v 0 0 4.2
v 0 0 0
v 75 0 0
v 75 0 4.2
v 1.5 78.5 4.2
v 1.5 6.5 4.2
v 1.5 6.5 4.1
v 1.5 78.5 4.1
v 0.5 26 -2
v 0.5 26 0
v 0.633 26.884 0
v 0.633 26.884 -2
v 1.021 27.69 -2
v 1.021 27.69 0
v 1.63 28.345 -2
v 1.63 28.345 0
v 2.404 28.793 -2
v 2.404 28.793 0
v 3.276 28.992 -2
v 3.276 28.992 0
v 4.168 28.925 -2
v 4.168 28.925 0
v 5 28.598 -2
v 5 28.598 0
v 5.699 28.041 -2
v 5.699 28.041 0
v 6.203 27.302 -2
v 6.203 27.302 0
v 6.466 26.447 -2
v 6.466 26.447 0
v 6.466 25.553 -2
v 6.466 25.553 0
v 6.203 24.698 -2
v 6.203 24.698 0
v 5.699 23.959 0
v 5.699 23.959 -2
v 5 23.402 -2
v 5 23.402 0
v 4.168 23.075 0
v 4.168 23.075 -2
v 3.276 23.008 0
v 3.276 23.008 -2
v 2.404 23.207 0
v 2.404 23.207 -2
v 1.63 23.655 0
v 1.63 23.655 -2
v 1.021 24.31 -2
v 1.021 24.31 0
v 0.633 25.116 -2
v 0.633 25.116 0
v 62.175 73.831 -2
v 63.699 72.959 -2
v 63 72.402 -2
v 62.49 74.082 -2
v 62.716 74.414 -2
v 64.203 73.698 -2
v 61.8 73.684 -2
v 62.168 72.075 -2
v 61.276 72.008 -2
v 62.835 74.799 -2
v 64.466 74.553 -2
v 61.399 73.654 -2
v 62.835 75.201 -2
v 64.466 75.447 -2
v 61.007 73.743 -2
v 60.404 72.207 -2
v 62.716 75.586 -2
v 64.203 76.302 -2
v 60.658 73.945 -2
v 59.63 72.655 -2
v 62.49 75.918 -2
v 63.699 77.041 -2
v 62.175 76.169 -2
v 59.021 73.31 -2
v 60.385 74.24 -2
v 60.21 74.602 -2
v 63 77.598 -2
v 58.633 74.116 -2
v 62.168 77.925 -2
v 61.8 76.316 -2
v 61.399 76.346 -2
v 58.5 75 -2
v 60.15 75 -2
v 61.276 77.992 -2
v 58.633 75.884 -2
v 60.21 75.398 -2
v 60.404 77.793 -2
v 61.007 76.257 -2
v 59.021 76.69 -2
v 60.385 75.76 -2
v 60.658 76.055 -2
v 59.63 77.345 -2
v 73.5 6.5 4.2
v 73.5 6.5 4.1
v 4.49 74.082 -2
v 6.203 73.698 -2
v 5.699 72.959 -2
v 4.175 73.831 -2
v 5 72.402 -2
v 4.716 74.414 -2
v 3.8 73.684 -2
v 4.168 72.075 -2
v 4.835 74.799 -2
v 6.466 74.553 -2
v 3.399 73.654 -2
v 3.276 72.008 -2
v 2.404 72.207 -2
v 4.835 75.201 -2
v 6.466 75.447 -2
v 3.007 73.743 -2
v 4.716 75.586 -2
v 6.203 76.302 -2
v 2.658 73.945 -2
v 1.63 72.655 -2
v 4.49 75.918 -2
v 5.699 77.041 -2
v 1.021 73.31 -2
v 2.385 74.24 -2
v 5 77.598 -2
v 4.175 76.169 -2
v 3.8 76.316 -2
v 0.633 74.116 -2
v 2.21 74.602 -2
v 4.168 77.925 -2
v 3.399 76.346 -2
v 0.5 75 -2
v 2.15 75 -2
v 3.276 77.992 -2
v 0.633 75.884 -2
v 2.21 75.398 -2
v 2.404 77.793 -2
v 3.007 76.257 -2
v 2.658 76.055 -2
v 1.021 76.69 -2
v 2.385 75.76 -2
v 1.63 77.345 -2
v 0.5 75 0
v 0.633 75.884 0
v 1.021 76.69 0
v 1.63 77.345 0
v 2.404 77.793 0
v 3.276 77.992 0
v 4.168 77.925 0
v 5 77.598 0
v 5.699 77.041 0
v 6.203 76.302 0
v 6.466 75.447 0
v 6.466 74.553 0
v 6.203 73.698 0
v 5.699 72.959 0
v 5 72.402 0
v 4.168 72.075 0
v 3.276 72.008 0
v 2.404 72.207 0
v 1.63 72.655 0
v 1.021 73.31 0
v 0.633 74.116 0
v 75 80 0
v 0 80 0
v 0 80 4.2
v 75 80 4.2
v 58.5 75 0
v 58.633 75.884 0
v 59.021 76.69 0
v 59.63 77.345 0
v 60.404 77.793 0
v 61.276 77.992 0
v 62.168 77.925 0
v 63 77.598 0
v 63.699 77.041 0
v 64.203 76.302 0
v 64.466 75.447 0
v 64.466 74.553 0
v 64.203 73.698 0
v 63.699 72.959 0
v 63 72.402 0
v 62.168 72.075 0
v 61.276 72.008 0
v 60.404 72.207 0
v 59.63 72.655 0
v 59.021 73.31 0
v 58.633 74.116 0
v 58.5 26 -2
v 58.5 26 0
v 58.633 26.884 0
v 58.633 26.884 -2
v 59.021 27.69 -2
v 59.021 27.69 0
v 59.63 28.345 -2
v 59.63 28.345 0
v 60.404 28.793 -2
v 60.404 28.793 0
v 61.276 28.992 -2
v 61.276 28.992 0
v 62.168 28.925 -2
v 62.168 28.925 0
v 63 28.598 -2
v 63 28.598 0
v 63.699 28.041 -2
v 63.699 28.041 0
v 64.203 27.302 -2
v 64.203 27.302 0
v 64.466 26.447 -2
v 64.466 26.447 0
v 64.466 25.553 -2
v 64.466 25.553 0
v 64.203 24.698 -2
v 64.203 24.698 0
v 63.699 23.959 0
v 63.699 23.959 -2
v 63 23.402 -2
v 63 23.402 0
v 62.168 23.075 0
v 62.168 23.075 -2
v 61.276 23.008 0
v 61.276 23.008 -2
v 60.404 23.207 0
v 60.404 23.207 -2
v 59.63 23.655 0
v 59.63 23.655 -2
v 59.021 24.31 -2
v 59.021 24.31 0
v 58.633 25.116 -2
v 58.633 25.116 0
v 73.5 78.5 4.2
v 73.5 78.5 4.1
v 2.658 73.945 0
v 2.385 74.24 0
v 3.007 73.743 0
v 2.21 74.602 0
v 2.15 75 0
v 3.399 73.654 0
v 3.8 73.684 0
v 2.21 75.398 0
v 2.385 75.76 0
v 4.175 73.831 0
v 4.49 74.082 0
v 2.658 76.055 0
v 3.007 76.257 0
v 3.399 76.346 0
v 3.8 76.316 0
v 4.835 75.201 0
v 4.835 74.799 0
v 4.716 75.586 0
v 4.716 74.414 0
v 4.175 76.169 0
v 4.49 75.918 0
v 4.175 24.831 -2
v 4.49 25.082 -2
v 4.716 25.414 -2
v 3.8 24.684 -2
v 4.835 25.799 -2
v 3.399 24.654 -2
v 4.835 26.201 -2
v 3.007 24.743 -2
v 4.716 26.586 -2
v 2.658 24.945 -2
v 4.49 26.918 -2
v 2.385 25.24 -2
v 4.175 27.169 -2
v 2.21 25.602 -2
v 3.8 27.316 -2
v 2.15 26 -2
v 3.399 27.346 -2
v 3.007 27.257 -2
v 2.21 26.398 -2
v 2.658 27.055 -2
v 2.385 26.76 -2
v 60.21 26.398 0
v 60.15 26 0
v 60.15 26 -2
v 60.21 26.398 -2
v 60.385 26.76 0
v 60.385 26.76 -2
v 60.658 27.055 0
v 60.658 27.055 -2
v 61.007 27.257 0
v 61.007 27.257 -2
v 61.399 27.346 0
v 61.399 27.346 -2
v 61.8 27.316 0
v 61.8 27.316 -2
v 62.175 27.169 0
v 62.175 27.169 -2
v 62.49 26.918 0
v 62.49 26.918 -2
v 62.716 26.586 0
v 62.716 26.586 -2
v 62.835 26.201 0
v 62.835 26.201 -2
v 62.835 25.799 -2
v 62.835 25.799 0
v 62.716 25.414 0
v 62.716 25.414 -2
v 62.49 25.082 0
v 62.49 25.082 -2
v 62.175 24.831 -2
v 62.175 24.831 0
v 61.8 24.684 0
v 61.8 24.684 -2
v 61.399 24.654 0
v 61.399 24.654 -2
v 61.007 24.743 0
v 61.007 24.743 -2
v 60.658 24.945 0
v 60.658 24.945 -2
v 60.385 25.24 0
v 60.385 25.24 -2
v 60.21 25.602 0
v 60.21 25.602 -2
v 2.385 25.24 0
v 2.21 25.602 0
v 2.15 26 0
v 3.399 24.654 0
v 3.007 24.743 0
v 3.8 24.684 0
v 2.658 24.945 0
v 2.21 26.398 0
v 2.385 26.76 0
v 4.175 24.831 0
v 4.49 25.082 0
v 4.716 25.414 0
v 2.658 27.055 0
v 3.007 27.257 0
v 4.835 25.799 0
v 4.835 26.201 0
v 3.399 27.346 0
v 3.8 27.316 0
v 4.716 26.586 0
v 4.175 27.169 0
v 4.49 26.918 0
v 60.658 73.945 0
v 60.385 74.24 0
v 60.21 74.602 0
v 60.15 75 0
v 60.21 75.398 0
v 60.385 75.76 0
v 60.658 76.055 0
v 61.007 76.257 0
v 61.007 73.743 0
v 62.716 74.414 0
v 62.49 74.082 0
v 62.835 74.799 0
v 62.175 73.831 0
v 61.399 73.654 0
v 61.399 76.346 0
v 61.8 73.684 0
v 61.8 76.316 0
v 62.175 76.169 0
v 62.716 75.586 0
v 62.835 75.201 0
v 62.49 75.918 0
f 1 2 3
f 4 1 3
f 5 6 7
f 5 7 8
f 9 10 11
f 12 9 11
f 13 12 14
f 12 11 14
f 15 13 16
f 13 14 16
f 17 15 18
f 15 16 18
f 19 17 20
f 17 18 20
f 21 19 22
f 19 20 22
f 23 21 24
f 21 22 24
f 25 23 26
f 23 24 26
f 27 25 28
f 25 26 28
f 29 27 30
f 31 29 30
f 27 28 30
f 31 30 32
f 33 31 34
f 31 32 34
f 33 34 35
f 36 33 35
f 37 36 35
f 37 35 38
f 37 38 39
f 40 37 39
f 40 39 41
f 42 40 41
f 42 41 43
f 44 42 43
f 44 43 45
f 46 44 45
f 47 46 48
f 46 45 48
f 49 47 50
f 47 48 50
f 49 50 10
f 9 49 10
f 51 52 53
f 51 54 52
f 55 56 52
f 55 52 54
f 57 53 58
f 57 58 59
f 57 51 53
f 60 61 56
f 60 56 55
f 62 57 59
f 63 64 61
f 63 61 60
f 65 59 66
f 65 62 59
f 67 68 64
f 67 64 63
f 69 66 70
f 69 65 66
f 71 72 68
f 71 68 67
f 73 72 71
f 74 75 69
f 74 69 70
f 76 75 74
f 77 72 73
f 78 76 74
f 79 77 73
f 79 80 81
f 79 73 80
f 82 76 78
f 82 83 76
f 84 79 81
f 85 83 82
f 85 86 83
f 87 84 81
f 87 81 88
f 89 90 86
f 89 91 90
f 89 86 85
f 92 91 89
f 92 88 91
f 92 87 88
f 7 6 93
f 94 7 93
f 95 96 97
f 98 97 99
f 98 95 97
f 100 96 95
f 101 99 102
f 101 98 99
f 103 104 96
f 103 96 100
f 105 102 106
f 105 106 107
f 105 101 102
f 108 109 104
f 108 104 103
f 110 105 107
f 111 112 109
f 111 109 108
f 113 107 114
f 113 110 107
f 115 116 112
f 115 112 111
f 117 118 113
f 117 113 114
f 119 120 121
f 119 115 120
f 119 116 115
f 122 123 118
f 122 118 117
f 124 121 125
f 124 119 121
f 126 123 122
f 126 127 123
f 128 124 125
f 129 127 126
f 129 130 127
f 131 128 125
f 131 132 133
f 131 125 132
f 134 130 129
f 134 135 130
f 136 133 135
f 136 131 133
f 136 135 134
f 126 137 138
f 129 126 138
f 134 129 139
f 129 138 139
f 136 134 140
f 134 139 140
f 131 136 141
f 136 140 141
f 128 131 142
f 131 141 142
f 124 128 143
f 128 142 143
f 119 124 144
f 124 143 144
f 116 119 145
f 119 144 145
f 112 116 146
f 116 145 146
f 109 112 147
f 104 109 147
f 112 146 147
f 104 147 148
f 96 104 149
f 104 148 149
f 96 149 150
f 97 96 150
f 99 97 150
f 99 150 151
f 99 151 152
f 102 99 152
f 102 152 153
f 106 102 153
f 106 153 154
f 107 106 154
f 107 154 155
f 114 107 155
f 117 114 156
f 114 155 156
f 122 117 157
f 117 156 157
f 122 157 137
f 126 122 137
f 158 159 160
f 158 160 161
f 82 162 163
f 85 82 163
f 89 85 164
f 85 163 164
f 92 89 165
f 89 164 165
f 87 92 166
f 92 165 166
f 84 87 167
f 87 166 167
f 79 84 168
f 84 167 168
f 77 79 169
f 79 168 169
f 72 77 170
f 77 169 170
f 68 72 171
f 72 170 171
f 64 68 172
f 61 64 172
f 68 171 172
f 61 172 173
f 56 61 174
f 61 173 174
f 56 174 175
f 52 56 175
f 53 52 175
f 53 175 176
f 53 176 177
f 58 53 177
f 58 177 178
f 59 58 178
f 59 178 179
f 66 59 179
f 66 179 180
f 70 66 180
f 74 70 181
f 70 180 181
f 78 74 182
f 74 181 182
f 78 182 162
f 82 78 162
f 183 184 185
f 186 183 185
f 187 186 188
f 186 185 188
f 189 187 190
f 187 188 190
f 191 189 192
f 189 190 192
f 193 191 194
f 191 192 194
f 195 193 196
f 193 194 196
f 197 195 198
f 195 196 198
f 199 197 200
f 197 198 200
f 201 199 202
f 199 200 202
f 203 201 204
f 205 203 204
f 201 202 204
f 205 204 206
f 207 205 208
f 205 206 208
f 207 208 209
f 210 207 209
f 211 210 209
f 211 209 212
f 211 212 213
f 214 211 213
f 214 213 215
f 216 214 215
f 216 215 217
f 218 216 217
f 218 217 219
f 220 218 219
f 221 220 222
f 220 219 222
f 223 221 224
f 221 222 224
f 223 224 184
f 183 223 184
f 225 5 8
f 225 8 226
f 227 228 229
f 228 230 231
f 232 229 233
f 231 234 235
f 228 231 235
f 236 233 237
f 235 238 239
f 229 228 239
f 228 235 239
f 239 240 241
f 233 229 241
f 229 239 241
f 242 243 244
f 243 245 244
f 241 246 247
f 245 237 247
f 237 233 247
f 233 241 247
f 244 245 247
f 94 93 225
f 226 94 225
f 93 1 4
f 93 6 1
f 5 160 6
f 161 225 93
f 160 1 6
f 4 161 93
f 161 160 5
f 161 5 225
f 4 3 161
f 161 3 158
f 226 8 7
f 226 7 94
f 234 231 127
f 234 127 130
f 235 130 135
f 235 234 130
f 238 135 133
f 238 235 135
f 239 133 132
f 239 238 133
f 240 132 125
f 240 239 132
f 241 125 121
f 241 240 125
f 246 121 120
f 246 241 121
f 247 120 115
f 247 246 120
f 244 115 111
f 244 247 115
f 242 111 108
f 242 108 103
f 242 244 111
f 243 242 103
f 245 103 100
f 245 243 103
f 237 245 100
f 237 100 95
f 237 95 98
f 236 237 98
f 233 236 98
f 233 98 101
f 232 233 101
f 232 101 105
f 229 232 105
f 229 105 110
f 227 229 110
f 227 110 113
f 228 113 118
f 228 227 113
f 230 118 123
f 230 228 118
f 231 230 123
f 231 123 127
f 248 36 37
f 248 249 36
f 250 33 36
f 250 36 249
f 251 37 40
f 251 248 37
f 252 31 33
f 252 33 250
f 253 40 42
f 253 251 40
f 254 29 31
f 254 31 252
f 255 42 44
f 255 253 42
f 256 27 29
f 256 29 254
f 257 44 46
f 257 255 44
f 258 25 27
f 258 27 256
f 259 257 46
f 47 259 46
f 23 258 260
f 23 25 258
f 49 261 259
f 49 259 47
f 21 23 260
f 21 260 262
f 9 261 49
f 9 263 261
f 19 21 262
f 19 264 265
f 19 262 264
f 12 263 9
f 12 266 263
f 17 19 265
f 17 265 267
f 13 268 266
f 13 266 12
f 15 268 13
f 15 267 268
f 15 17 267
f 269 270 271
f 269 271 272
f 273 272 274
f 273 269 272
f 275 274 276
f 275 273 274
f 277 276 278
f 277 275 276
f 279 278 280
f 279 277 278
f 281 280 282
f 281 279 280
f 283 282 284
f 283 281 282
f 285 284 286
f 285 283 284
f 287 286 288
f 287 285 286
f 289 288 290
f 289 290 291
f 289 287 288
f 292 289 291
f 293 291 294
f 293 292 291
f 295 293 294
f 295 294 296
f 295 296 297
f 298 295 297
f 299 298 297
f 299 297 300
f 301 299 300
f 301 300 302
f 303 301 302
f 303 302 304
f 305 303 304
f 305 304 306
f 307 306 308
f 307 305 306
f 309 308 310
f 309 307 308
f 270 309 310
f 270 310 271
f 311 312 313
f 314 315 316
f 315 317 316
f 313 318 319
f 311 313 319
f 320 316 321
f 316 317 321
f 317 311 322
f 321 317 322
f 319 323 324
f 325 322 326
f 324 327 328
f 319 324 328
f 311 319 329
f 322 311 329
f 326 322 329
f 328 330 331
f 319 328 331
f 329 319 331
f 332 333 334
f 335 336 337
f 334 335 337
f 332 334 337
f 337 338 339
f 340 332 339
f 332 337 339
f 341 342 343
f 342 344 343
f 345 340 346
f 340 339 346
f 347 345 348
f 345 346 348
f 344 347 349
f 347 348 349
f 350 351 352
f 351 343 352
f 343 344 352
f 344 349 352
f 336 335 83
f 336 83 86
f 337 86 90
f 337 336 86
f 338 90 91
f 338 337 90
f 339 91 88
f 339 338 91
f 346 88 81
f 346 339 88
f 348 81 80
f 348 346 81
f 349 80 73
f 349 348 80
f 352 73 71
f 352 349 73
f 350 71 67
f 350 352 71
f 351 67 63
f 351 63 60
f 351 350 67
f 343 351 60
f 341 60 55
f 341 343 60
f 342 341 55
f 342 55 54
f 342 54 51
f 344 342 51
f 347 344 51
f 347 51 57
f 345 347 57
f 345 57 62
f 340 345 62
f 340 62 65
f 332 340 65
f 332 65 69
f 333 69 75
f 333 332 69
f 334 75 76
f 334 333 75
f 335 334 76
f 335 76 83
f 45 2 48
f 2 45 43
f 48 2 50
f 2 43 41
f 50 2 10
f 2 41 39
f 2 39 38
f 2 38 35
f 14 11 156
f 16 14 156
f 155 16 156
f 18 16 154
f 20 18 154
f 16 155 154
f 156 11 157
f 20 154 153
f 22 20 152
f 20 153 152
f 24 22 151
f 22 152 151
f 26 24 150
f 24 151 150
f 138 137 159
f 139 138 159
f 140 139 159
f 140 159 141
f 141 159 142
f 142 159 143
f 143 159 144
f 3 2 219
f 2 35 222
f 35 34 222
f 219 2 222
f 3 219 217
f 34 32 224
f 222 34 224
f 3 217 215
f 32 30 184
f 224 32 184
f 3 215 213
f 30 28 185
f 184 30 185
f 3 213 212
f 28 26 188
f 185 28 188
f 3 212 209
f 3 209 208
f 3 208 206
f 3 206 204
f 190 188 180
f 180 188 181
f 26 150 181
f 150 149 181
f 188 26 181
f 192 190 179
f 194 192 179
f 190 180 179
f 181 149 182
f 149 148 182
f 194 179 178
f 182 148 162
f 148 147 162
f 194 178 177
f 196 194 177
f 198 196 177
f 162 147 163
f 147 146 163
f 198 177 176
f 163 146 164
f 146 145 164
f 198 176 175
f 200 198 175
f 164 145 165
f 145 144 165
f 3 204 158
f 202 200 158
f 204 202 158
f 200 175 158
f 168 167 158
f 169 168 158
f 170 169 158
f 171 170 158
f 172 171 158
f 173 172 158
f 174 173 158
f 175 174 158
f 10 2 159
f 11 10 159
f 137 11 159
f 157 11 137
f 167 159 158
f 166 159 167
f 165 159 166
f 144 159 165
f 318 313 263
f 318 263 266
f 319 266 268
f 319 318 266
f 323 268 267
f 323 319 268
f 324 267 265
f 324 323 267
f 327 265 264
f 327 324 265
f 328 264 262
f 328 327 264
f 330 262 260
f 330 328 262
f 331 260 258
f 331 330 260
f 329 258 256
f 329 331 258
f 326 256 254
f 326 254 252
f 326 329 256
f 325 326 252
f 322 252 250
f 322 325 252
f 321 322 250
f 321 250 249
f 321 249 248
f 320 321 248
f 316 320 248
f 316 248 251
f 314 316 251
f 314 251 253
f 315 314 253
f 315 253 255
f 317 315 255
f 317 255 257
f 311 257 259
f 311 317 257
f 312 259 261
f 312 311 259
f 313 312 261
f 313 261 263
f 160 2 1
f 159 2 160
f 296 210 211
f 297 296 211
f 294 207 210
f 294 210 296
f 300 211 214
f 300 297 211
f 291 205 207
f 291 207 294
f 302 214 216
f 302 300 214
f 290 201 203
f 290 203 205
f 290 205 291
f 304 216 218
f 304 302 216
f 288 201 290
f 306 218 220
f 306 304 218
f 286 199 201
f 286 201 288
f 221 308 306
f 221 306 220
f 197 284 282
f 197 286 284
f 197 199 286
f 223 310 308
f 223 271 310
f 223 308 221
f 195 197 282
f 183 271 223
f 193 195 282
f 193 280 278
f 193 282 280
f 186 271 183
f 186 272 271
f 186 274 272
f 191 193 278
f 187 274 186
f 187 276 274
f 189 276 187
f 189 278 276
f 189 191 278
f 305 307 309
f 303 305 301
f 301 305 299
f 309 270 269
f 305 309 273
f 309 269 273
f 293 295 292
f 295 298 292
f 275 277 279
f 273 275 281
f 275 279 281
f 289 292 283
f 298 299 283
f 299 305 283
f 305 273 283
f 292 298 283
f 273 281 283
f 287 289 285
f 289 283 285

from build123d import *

# Parameters (mm, degrees)
SKETCH1_W           = 75
SKETCH1_H           = 80
BOSS_EXTRUDE1_DEPTH = 4.2
SKETCH2_W           = 72
SKETCH2_H           = 72
CUT_EXTRUDE1_DEPTH  = 0.1
SKETCH3_R           = 3
SKETCH3_R_2         = 1.35
BOSS_EXTRUDE2_DEPTH = 2


with BuildPart() as part:
    # Sketch1 → Boss-Extrude1 (new body)
    with BuildSketch(Plane.XY):
        with Locations((37.5, 40)):
            Rectangle(SKETCH1_W, SKETCH1_H)
    extrude(amount=BOSS_EXTRUDE1_DEPTH)

    # Sketch2 → Cut-Extrude1 (cut)
    with BuildSketch(Plane.XY.offset(4.2)):
        with Locations((37.5, 42.5)):
            Rectangle(SKETCH2_W, SKETCH2_H)
    extrude(amount=-CUT_EXTRUDE1_DEPTH, mode=Mode.SUBTRACT)

    # Sketch3 → Boss-Extrude2 (add)
    with BuildSketch(Plane(origin=(0, 0, 0), x_dir=(-1, 0, 0), z_dir=(0, 0, -1))):
        with Locations((-61.5, 75)):
            Circle(SKETCH3_R)
        with Locations((-61.5, 75)):
            Circle(SKETCH3_R_2, mode=Mode.SUBTRACT)
        with Locations((-3.5, 75)):
            Circle(SKETCH3_R)
        with Locations((-3.5, 75)):
            Circle(SKETCH3_R_2, mode=Mode.SUBTRACT)
        with Locations((-3.5, 26)):
            Circle(SKETCH3_R)
        with Locations((-3.5, 26)):
            Circle(SKETCH3_R_2, mode=Mode.SUBTRACT)
        with Locations((-61.5, 26)):
            Circle(SKETCH3_R)
        with Locations((-61.5, 26)):
            Circle(SKETCH3_R_2, mode=Mode.SUBTRACT)
    extrude(amount=BOSS_EXTRUDE2_DEPTH)


solid = part.part
